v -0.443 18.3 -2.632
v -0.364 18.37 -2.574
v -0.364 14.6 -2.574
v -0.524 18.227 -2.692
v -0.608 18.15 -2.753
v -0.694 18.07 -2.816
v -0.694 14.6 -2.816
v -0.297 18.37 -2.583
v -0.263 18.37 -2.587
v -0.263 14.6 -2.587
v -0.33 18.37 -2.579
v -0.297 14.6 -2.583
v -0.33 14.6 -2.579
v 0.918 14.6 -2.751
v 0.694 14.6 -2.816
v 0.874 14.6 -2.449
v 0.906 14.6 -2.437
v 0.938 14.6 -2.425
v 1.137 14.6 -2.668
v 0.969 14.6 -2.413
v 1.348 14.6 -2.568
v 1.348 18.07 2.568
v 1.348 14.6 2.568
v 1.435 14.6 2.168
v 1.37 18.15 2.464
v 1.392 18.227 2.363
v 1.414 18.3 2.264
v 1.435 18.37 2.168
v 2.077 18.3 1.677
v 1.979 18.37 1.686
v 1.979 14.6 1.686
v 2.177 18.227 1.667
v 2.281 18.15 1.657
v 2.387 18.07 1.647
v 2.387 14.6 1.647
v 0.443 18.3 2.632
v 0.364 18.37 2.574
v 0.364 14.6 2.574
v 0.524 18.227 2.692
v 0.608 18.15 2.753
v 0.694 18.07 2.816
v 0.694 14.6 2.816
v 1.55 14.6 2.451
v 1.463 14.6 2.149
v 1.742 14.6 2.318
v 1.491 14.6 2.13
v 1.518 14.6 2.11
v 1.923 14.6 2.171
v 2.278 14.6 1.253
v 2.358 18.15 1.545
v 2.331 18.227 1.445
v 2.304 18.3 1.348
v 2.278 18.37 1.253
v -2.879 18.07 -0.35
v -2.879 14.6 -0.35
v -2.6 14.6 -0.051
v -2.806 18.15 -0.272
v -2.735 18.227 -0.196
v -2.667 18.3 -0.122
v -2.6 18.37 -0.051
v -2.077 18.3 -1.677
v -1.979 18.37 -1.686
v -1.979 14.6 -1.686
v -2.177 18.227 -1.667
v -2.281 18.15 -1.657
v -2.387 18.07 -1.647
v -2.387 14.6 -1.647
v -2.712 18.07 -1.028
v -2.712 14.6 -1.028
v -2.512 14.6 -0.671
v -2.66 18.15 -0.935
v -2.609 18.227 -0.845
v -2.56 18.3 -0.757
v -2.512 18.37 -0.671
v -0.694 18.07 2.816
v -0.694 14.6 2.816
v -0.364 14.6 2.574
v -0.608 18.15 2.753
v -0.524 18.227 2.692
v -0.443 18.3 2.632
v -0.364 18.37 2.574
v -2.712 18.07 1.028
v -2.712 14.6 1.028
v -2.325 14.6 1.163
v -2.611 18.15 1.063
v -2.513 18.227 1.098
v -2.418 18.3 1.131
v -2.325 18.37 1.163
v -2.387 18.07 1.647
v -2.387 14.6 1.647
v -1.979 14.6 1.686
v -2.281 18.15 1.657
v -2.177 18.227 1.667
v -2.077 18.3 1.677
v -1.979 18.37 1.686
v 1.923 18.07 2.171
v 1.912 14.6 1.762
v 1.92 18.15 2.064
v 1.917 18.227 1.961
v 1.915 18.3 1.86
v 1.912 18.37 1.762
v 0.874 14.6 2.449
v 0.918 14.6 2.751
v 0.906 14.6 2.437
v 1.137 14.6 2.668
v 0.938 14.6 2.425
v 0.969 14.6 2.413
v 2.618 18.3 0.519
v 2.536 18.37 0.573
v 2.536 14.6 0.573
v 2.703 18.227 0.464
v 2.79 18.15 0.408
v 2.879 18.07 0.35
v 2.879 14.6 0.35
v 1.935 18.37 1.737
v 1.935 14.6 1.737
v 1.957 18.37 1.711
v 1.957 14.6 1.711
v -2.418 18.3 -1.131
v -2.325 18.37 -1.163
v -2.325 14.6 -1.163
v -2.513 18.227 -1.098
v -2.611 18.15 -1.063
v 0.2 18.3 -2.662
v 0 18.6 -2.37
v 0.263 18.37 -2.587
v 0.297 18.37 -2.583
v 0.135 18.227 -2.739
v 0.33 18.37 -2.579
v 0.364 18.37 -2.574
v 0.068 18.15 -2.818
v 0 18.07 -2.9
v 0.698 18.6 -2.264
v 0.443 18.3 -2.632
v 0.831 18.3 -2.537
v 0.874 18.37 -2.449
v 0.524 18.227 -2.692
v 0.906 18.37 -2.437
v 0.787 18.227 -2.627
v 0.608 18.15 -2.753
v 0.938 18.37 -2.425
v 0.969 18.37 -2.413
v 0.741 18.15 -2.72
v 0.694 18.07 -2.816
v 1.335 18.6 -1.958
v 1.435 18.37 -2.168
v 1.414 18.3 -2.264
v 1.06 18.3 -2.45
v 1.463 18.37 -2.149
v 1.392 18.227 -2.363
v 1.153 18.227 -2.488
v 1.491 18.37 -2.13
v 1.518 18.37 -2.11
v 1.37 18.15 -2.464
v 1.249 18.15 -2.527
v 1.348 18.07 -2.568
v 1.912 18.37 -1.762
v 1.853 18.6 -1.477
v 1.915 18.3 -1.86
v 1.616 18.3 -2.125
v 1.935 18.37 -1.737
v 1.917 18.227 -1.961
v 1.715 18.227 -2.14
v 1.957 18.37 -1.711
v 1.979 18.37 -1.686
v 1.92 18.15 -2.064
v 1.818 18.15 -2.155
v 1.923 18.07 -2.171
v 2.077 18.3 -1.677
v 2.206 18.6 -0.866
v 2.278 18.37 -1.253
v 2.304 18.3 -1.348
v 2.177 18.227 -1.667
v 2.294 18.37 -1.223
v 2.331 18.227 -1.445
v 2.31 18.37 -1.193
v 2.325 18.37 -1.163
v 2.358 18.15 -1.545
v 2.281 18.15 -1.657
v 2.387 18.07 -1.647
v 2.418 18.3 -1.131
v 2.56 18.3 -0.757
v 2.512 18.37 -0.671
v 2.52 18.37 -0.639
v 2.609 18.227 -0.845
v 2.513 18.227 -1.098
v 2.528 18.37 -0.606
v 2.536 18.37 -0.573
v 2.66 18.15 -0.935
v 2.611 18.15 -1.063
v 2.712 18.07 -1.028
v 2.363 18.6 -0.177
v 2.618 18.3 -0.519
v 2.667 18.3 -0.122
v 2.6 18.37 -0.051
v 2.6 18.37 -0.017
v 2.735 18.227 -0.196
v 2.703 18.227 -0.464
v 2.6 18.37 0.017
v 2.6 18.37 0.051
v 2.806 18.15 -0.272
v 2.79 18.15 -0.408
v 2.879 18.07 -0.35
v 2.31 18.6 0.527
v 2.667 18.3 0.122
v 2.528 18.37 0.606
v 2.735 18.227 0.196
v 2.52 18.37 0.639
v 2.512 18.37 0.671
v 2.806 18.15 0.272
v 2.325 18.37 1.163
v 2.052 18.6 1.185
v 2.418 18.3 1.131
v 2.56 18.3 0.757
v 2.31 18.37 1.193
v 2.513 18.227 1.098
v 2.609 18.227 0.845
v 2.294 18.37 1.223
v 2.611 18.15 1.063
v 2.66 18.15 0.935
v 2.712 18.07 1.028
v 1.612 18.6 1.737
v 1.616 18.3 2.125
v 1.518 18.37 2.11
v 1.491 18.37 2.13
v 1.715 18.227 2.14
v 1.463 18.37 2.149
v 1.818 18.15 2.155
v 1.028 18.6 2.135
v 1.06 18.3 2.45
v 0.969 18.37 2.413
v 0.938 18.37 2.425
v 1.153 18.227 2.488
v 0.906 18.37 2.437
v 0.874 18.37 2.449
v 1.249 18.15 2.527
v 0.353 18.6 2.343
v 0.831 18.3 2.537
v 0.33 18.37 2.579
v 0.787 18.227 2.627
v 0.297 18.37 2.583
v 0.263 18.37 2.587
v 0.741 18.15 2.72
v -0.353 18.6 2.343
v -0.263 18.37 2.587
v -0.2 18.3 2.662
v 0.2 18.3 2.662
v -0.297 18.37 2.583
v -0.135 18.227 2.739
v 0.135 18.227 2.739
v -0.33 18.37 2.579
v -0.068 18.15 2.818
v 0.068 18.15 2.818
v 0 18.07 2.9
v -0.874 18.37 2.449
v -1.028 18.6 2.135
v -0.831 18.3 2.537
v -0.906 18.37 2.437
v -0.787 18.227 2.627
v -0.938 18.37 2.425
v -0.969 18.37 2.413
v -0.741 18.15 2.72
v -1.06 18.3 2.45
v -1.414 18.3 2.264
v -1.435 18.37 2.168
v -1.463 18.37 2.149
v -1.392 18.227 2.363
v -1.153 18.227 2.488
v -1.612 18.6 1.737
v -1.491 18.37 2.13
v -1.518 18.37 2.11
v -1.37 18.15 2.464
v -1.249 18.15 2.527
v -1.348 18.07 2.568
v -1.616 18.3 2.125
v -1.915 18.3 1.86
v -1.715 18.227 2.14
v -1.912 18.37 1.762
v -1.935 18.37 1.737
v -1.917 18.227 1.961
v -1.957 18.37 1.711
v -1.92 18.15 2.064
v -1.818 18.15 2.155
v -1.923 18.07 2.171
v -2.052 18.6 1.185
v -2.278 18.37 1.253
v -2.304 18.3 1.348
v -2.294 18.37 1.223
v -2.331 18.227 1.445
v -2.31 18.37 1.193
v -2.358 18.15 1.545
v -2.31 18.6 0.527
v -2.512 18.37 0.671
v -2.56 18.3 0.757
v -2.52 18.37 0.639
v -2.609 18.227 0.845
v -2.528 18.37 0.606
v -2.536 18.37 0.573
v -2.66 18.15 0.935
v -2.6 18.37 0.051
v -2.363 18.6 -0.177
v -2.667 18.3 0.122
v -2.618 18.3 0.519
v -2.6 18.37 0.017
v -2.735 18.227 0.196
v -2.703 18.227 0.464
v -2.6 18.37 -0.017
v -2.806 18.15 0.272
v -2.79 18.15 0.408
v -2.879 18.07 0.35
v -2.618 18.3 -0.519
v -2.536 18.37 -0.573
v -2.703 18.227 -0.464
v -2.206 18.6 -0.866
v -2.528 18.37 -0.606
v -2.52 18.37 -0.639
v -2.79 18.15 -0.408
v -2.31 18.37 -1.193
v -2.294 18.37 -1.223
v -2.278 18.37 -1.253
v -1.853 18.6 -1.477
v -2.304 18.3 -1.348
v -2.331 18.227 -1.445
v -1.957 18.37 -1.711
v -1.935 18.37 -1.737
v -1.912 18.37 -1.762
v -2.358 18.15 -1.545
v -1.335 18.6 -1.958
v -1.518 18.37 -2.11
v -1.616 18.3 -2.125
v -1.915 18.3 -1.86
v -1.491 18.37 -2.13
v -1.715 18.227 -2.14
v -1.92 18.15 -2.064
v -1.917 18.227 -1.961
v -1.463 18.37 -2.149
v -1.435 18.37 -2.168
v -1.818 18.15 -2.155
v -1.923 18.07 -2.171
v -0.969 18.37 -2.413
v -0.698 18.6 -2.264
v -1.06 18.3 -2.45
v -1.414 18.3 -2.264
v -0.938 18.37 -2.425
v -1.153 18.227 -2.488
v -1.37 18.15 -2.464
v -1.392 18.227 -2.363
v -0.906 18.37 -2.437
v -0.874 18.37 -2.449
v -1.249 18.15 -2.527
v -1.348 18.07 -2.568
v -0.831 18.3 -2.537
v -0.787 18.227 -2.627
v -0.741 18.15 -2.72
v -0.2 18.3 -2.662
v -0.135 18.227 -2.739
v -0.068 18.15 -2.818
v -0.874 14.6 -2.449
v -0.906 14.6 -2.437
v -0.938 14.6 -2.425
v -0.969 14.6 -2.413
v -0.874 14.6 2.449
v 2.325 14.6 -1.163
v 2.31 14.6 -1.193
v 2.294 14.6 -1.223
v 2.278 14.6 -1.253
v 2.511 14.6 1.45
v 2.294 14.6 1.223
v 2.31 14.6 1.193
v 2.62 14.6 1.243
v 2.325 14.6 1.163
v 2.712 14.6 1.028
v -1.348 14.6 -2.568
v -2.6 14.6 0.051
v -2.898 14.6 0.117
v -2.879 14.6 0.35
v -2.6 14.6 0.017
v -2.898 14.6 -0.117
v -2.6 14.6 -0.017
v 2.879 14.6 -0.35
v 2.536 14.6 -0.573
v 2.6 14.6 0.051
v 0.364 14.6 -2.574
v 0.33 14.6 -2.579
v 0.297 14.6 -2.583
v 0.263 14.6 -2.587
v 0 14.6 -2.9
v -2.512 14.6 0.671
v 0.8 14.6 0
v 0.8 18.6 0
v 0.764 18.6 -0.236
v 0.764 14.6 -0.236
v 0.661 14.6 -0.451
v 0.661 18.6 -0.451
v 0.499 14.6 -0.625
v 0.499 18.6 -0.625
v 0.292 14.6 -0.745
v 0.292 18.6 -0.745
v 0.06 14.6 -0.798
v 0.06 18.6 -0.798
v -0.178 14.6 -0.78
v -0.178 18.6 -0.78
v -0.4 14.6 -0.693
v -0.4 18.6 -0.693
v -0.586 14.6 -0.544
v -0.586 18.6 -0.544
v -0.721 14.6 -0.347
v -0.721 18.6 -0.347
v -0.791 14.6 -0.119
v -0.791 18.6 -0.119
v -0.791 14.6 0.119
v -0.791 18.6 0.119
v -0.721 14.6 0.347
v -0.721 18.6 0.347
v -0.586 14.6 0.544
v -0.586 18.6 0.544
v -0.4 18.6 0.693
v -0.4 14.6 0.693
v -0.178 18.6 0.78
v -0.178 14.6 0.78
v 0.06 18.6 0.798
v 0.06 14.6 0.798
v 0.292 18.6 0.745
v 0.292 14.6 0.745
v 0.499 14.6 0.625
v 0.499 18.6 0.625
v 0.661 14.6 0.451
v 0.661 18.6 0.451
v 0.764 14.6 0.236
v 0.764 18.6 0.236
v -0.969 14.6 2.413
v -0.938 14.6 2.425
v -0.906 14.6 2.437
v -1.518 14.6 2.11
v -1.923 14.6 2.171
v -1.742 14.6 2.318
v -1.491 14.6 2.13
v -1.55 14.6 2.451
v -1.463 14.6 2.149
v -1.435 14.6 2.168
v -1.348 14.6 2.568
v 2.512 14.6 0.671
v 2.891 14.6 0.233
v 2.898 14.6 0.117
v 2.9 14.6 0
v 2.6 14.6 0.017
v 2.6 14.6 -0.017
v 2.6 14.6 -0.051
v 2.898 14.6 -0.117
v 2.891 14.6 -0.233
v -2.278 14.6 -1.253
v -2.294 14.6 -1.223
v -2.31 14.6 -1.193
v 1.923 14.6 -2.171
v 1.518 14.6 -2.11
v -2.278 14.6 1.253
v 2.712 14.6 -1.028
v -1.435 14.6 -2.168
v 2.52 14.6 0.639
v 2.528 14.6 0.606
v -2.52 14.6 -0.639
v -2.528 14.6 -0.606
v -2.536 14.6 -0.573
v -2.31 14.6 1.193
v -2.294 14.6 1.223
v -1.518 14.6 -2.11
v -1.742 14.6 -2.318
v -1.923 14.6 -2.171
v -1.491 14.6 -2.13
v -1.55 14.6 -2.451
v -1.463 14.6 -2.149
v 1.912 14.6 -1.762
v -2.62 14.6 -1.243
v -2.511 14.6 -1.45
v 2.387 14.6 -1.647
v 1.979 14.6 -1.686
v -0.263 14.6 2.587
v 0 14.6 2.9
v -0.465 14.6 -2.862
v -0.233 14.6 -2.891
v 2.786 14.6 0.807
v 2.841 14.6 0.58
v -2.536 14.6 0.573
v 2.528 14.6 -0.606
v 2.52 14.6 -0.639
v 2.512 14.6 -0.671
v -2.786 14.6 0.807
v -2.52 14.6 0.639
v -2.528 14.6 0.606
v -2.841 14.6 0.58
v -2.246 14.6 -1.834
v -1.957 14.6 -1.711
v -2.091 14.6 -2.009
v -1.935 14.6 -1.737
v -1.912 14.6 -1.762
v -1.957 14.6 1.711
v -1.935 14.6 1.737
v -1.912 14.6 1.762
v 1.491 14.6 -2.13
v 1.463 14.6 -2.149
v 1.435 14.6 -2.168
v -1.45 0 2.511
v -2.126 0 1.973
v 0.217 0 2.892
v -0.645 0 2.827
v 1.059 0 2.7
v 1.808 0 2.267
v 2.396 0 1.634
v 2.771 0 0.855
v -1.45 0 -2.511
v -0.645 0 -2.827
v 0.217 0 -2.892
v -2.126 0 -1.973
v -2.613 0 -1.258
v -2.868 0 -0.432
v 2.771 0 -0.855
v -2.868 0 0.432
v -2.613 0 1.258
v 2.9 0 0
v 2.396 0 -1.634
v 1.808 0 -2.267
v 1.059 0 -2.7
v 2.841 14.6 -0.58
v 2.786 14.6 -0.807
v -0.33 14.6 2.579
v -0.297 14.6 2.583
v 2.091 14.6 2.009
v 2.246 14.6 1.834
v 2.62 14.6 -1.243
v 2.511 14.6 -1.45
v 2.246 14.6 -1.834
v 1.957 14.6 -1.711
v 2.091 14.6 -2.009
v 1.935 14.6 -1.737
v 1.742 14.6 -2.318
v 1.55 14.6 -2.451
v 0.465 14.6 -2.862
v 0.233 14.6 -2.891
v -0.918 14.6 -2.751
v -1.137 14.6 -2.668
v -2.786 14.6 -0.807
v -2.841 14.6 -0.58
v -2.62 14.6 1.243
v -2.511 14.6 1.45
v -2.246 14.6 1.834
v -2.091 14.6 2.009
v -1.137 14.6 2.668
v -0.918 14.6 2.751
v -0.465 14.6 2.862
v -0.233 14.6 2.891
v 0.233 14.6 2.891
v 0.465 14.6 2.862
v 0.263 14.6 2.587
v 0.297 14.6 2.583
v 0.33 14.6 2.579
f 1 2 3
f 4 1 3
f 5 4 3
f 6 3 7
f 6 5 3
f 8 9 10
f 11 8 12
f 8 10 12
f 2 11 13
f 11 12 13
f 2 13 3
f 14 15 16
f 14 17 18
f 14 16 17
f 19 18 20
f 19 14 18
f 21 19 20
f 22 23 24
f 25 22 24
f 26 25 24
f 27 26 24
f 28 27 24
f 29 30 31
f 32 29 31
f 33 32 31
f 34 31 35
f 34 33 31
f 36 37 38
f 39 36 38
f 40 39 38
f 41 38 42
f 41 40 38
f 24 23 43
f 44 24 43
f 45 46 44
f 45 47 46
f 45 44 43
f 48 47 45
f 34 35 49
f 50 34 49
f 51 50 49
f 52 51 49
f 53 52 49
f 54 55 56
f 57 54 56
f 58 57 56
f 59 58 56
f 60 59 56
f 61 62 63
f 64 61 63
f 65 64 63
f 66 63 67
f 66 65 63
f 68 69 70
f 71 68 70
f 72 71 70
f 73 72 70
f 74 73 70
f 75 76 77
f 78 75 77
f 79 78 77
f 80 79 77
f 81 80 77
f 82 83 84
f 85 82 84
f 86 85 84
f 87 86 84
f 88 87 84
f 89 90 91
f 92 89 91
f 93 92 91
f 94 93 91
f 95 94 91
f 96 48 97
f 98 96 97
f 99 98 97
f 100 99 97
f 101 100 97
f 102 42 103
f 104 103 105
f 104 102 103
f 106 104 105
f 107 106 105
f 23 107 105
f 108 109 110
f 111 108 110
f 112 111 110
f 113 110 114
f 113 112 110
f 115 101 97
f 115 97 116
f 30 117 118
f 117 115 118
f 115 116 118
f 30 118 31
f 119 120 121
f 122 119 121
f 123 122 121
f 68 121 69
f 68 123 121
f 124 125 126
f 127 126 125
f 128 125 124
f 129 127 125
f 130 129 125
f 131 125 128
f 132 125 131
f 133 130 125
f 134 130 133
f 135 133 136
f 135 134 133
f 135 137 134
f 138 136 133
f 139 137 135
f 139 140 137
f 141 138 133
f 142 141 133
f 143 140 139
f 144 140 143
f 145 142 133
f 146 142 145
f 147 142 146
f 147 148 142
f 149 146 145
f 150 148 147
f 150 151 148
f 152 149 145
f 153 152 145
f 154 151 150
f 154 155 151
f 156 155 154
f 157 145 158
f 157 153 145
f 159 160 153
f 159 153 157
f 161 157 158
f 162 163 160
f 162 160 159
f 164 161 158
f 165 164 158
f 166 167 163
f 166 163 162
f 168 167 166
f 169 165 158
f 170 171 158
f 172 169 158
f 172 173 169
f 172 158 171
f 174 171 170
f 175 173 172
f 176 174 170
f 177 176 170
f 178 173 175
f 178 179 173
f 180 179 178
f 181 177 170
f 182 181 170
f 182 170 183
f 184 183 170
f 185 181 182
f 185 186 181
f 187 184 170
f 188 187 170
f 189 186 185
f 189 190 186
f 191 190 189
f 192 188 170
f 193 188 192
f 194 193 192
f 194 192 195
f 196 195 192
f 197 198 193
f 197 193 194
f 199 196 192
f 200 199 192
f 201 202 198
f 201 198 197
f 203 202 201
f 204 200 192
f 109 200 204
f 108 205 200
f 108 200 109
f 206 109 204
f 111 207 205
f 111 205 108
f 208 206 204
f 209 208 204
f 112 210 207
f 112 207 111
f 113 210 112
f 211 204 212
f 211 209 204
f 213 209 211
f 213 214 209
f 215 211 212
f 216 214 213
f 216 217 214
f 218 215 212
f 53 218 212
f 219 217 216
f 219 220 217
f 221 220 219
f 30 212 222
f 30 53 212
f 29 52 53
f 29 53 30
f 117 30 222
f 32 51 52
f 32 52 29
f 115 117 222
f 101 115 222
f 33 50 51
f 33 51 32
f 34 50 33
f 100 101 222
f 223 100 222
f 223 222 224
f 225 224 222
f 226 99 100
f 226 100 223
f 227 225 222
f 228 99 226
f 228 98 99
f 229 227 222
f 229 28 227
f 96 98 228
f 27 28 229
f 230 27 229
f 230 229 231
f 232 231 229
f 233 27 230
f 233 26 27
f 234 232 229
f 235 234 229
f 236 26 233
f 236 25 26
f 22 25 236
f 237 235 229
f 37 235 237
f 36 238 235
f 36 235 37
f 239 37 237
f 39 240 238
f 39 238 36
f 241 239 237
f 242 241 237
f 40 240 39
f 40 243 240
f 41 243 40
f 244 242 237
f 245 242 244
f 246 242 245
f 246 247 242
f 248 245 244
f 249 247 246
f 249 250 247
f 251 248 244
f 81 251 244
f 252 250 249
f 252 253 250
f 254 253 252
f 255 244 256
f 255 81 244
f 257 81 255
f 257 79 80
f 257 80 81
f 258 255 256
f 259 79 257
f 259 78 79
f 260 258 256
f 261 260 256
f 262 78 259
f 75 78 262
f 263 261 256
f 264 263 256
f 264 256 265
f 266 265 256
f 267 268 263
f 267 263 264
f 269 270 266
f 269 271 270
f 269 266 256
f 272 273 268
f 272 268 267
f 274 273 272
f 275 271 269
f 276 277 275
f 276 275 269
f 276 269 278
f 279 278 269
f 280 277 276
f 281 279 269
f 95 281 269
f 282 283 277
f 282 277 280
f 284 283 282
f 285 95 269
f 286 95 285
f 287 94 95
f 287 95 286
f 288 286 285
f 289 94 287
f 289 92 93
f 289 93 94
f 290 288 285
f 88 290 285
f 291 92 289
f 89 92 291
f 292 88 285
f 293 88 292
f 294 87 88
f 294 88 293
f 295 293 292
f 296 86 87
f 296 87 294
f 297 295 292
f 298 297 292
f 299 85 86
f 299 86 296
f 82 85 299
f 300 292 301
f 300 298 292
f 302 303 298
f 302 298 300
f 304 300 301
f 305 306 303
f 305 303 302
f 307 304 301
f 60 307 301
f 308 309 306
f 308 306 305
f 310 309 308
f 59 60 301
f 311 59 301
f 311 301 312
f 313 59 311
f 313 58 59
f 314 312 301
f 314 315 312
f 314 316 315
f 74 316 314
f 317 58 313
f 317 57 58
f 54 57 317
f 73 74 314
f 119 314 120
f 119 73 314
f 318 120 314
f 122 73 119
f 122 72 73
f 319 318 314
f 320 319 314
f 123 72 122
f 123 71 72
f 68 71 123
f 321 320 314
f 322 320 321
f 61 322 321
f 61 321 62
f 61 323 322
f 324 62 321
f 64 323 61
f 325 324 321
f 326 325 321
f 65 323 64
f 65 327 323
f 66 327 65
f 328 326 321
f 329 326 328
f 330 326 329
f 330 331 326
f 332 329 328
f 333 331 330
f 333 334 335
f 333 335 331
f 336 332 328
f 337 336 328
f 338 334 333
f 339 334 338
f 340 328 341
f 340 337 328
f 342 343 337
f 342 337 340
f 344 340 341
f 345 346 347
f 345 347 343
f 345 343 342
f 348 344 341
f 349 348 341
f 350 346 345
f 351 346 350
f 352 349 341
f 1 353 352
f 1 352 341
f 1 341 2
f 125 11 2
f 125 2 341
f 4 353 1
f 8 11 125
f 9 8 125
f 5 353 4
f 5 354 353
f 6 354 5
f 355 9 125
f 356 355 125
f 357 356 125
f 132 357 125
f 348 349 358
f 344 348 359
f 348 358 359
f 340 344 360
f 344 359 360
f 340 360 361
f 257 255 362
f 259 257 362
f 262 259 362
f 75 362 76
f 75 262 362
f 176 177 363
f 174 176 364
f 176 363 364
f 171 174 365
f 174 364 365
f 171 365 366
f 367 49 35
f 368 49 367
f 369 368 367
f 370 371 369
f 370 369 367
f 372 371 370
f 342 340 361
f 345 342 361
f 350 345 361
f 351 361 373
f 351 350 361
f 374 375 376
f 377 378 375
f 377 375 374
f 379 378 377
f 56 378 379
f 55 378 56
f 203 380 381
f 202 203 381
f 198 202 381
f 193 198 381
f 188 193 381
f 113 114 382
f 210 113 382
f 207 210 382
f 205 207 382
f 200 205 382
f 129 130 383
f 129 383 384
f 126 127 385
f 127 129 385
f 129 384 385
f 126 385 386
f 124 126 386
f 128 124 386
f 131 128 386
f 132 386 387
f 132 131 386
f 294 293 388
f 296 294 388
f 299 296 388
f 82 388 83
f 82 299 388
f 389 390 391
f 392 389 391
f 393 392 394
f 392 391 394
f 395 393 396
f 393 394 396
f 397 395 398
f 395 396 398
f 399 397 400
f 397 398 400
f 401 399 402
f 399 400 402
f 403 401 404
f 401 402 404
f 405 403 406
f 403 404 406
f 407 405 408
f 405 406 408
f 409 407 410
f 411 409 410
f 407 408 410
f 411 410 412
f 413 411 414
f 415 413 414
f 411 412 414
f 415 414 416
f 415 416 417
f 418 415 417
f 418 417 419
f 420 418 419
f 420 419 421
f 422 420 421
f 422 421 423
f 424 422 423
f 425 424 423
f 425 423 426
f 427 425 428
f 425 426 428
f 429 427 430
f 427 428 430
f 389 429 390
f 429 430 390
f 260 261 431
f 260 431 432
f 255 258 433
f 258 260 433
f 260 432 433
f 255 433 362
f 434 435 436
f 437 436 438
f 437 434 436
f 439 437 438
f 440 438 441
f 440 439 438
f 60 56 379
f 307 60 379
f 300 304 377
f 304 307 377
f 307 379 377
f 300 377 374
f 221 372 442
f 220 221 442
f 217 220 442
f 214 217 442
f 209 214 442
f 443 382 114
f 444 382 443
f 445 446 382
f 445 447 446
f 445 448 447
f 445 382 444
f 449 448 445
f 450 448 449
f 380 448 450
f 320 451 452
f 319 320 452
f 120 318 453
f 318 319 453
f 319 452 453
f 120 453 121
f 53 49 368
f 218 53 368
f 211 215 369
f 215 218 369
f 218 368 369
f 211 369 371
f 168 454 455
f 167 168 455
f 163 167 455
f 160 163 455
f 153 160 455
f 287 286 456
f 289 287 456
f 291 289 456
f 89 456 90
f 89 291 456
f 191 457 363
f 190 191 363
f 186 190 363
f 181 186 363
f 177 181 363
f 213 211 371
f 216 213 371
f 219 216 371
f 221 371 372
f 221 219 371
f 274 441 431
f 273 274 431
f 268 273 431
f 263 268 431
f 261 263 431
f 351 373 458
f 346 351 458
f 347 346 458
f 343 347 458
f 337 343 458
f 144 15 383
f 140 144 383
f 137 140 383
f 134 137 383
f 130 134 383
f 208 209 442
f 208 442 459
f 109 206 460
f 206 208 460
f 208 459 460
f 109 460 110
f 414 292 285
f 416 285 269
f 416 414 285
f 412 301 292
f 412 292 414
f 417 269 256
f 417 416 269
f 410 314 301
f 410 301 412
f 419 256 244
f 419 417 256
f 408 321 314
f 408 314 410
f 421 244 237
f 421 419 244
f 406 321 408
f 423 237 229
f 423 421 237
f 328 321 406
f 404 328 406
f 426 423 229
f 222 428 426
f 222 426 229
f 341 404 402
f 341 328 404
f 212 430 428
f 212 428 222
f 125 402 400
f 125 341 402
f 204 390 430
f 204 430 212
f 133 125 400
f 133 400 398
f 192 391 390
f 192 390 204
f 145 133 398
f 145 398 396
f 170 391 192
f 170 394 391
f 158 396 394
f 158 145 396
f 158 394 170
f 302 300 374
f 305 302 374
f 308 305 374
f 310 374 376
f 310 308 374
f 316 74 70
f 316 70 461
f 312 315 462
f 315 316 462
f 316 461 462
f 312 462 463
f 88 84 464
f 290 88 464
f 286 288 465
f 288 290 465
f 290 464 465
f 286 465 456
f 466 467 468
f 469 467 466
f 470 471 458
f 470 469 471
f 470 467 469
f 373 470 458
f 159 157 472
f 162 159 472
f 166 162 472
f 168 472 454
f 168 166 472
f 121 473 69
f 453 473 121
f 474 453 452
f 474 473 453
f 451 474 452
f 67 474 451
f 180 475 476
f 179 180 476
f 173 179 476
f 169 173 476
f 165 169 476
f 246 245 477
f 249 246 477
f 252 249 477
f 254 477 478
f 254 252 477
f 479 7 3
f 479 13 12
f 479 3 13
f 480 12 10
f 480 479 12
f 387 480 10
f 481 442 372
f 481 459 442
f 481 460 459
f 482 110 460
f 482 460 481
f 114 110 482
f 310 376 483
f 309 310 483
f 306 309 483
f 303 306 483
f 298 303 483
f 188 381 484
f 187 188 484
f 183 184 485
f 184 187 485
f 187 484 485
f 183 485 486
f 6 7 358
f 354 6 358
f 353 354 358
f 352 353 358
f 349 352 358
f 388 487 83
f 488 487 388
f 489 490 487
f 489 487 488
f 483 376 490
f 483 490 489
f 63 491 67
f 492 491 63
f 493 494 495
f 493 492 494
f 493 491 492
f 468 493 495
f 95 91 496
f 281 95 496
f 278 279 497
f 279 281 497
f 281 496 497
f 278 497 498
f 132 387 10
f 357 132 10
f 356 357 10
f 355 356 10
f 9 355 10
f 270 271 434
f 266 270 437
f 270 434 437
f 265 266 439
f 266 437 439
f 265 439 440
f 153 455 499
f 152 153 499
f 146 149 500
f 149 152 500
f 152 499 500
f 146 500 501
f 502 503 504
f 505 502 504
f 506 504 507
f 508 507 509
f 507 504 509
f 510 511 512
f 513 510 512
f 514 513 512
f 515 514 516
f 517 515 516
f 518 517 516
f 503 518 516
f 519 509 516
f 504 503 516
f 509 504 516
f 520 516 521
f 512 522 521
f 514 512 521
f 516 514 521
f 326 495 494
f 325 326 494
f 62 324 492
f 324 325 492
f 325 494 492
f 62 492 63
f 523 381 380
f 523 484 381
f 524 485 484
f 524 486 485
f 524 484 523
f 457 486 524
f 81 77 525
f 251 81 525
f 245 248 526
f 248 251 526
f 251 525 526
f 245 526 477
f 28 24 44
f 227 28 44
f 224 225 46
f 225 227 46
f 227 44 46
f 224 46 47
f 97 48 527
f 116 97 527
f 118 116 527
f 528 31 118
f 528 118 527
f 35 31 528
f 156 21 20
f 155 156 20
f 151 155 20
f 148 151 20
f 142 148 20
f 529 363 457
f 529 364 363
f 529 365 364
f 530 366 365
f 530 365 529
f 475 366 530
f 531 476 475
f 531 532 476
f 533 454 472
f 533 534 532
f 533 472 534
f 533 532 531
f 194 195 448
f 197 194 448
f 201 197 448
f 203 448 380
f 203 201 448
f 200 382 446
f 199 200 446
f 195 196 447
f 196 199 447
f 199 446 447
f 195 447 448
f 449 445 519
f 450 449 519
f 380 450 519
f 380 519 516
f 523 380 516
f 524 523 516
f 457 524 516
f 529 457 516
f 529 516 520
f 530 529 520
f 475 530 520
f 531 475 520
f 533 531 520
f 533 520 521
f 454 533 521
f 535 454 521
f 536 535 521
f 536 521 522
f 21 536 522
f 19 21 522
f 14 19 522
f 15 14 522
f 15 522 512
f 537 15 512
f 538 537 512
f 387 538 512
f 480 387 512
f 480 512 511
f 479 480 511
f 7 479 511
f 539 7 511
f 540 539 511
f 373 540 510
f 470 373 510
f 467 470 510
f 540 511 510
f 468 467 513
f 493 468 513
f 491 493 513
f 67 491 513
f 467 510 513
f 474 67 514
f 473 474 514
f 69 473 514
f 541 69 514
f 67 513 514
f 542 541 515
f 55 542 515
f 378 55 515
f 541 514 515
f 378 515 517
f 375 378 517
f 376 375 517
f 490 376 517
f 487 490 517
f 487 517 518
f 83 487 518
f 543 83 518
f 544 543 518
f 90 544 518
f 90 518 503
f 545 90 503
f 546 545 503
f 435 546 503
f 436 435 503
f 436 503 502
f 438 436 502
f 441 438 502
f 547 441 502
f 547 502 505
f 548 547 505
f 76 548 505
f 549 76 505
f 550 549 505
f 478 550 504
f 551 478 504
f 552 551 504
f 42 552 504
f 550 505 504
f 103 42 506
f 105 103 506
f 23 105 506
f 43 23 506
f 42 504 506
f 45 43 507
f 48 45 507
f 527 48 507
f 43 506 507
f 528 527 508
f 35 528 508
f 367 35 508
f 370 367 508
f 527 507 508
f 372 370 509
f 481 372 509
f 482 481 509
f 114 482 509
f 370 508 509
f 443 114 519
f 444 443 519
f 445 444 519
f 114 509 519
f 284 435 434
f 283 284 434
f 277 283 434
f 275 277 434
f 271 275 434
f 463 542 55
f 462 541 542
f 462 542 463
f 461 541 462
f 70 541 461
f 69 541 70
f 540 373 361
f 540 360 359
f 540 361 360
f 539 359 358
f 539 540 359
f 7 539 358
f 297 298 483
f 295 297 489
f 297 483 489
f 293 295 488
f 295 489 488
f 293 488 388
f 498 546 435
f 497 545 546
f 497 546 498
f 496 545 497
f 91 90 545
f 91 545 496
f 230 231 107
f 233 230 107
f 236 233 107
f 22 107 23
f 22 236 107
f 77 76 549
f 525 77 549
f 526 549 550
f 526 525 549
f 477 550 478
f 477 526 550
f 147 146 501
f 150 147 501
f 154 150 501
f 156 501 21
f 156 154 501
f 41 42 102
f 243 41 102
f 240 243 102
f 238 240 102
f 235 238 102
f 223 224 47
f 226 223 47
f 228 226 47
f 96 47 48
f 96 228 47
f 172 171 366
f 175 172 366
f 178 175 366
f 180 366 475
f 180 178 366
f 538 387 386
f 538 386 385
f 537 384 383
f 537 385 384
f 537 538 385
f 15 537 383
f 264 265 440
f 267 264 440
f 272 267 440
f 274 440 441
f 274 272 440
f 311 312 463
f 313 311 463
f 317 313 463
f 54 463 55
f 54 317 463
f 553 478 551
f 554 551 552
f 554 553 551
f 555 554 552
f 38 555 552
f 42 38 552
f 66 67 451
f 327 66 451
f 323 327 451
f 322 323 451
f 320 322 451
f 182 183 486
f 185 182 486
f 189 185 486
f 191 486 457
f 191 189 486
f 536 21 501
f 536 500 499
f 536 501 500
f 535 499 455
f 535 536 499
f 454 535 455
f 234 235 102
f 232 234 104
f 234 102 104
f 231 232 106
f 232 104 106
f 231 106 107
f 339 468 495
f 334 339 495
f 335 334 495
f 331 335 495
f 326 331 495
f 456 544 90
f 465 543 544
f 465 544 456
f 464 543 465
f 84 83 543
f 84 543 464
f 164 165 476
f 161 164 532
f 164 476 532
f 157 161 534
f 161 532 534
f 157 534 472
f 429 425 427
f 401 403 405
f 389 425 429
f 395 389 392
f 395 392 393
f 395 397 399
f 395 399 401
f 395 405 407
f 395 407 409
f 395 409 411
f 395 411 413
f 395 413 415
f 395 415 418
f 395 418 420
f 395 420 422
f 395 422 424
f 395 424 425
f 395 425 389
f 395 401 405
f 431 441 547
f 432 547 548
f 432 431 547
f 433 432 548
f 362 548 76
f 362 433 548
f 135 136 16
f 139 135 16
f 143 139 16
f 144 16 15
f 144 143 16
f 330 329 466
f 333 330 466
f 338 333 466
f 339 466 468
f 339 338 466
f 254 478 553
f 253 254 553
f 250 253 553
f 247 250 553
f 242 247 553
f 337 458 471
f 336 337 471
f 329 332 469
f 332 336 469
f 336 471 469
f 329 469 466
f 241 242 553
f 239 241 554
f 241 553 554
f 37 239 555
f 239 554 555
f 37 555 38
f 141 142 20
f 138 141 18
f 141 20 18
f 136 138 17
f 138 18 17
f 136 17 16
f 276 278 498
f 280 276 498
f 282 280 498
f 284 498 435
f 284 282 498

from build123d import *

# Parameters (mm, degrees)
SHAFTS_R              = 2.9
SHAFT_DEPTH           = 14.6
SHAFTEXTENSIONS_R     = 2.6
SHAFT_EXTENSION_DEPTH = 4
TOOTH_DEPTH           = 18.6
TOOTH_CP_COUNT        = 26
SMALLBORES_R          = 0.8
SMALL_BORE_DEPTH      = 4


with BuildPart() as part:
    # ShaftS → SHAFT (new body)
    with BuildSketch(Plane(origin=(0, 0, 0), x_dir=(1, 0, 0), z_dir=(0, 1, 0))):
        Circle(SHAFTS_R)
    extrude(amount=SHAFT_DEPTH)

    # ShaftExtensionS → SHAFT EXTENSION (add)
    with BuildSketch(Plane(origin=(0, 14.6, 0), x_dir=(1, 0, 0), z_dir=(0, 1, 0))):
        Circle(SHAFTEXTENSIONS_R)
    extrude(amount=SHAFT_EXTENSION_DEPTH)

    # ToothS → TOOTH (add)
    with BuildSketch(Plane(origin=(0, 18.6, 0), x_dir=(1, 0, 0), z_dir=(0, 1, 0))):
        with BuildLine():
            Line((0, 2.9), (-0.262912611, 2.586672952))
            ThreePointArc((-0.262912611, 2.586672952), (0, 2.6), (0.262912611, 2.586672952))
            Line((0.262912611, 2.586672952), (0, 2.9))
        make_face()
    tooth = extrude(amount=-TOOTH_DEPTH)

    # TOOTH CP: TOOTH ×26 about axis
    tooth_cp_axis = Axis((0, 0, 0), (0, 1, 0))
    for i in range(1, TOOTH_CP_COUNT):
        add(tooth.rotate(tooth_cp_axis, i * 360 / TOOTH_CP_COUNT))

    # SmallBoreS → SMALL BORE (cut)
    with BuildSketch(Plane(origin=(0, 18.6, 0), x_dir=(1, 0, 0), z_dir=(0, 1, 0))):
        Circle(SMALLBORES_R)
    extrude(amount=-SMALL_BORE_DEPTH, mode=Mode.SUBTRACT)

    # TeethChamferS → TEETH CHAMFER (revolve, cut)
    with BuildSketch(Plane(origin=(0, 0, 0), x_dir=(0, 0, -1), z_dir=(1, 0, 0))):
        Polygon((2.9, 18.069669914), (2.9, 18.6), (2.369669914, 18.6), align=None)
    revolve(axis=Axis((0, 18.6, 0), (0, -1, 0)), mode=Mode.SUBTRACT)


solid = part.part
